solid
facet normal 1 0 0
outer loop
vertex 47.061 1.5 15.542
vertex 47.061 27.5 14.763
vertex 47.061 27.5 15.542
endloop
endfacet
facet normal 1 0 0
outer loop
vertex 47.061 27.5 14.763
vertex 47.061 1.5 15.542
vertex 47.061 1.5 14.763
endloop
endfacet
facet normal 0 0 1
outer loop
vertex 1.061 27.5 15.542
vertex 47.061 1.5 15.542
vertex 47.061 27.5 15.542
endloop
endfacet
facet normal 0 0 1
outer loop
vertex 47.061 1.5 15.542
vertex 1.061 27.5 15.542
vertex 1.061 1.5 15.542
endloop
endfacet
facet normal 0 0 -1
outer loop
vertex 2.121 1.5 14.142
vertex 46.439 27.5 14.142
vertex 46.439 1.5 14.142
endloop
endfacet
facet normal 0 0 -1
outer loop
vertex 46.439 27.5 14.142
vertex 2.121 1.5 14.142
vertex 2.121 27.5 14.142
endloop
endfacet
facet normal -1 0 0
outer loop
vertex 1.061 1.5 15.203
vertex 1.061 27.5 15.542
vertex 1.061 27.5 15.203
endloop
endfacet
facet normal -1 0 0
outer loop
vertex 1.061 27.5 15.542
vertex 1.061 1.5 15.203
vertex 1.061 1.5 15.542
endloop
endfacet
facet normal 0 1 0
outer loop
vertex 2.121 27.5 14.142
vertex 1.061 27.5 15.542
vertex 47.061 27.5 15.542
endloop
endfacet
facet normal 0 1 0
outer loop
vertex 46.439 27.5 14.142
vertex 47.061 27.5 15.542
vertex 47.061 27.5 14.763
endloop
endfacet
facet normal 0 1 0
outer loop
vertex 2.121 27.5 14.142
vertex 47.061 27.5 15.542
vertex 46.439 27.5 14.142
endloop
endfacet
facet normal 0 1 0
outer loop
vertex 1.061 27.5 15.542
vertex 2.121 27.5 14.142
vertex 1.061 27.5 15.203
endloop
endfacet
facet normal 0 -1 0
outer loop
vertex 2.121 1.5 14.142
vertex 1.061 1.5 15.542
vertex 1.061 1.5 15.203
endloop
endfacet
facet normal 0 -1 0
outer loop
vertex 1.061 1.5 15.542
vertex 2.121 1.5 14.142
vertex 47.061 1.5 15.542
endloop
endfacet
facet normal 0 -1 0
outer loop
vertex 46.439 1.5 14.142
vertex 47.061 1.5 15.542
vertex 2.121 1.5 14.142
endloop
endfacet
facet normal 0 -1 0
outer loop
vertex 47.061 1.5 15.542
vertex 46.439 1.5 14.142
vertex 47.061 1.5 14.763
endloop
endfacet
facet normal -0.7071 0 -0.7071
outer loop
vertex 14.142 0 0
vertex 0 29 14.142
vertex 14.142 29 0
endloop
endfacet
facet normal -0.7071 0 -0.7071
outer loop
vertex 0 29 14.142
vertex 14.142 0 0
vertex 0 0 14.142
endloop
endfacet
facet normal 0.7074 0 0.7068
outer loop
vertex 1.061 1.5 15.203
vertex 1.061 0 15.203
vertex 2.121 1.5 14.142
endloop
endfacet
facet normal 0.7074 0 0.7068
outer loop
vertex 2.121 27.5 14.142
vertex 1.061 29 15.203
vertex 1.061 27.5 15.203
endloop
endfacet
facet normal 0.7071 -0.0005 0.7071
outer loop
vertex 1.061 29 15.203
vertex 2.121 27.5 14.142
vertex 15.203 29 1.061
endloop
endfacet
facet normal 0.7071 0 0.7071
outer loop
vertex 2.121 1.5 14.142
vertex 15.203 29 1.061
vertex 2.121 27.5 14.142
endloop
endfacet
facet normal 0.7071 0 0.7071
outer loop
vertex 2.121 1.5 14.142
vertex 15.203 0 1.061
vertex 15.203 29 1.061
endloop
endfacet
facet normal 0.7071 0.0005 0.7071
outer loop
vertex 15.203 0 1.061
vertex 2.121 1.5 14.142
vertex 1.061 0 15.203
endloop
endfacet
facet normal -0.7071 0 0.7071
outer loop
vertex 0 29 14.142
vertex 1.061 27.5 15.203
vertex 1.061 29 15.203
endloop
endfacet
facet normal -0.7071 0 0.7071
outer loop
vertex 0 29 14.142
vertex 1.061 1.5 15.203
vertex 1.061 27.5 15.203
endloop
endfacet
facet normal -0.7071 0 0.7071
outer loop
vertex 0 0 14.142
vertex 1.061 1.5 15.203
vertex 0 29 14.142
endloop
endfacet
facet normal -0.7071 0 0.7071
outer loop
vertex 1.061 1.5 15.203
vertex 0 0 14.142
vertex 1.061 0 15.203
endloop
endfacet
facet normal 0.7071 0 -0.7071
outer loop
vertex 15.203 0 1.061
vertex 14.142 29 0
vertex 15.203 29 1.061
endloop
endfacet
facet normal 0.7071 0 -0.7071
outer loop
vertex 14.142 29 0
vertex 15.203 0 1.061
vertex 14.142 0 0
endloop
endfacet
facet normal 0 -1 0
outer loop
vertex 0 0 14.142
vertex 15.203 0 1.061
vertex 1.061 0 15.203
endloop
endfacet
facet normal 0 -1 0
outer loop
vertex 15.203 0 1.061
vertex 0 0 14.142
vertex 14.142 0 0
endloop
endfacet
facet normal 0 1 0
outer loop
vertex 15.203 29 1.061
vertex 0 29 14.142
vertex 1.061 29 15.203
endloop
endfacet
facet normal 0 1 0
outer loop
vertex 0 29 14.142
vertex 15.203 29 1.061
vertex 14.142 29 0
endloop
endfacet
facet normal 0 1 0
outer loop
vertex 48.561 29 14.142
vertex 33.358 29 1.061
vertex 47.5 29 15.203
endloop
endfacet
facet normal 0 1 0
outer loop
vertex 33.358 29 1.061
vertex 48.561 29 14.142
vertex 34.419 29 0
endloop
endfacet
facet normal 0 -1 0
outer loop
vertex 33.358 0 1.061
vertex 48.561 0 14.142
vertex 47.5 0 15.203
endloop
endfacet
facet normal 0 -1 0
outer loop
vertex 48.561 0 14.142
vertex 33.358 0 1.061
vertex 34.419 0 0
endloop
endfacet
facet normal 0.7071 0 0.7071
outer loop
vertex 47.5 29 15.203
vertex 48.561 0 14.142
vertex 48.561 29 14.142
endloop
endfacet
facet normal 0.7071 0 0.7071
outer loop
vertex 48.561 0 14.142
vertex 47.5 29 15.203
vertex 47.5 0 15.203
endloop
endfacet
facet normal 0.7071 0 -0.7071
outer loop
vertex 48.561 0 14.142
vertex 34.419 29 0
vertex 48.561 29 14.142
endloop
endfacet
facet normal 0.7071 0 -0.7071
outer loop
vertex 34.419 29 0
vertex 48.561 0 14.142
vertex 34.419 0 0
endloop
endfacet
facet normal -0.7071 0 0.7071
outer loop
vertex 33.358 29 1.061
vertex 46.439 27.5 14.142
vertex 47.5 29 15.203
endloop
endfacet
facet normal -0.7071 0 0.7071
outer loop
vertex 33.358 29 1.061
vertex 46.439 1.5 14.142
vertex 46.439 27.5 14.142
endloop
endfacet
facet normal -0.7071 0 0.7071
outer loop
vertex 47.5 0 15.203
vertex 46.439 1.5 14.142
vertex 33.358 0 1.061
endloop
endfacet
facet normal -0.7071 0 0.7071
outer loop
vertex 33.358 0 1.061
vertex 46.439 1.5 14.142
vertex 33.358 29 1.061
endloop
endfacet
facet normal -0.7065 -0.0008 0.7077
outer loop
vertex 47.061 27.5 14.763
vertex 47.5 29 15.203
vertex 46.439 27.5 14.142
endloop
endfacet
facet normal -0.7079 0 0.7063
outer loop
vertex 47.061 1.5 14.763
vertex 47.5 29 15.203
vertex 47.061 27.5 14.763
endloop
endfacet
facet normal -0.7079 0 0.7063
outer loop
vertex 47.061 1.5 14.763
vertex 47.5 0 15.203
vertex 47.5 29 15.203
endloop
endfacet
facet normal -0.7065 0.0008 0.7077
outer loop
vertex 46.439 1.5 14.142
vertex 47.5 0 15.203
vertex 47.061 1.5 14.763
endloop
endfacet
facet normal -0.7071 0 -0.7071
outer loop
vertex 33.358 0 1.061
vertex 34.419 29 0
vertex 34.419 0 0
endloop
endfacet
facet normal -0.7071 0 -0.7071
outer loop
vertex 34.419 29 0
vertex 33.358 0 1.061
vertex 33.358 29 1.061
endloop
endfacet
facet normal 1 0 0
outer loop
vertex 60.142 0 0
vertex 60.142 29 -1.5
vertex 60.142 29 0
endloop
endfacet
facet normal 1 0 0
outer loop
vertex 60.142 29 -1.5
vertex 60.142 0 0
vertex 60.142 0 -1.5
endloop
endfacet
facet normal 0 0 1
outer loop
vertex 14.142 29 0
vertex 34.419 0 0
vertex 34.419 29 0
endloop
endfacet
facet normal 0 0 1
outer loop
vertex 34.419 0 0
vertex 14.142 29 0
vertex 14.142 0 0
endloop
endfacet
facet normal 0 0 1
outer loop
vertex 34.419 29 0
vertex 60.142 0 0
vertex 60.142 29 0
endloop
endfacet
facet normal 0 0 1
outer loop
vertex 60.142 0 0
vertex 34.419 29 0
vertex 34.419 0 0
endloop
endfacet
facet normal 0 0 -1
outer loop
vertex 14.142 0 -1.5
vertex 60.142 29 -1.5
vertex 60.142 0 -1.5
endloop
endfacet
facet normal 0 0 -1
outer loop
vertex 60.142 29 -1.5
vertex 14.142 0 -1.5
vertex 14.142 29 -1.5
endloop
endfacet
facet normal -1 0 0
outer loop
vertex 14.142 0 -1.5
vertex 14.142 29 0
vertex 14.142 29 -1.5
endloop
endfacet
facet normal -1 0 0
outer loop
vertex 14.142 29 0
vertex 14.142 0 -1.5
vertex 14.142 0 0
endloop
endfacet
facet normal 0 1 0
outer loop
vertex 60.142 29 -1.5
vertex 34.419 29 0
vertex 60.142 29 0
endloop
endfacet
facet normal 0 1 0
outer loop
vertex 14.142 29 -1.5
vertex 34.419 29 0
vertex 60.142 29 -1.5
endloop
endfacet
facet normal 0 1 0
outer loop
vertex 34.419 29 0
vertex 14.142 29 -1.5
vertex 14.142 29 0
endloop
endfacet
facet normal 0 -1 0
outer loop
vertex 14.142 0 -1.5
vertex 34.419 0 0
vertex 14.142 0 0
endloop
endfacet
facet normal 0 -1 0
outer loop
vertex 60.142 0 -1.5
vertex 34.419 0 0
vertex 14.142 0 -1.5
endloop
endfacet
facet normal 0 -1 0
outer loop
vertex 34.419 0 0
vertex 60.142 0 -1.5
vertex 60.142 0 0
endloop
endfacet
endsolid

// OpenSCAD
// file: snzb-03.scad
$fn = 100;

module snzb03() {
  $WIDTH = 40;
  $HEIGHT = 35;
  $DEPTH = 16;
  $DIAMETER_DOME = 22;
  $DIAMETER_HOLE = 1;
  $DEPTH_RECESS = 0.5;

  // dome
  translate([$WIDTH / 2, $HEIGHT / 2, $DEPTH]) rotate([0, 90, 0]) sphere(d = $DIAMETER_DOME, $fn = 32);
  difference() {
    // main body
    cube([$WIDTH, $HEIGHT, $DEPTH]);

    // hole
    translate([$WIDTH / 2, 5, 9]) rotate([90, 0, 0]) cylinder(h = 10, d = $DIAMETER_HOLE);

    // cut corners
    translate([-2.75, -2.75, $DEPTH]) rotate([0, 0, 45]) cube([10, 10, $DEPTH * 2], center = true);
    translate([$WIDTH, $HEIGHT, 0]) translate([2.75, 2.75, $DEPTH]) rotate([0, 0, 45]) cube([10, 10, $DEPTH * 2], center = true);

    // recesses
    translate([2.5, -1, 1.5]) cube([$WIDTH, $DEPTH_RECESS + 1, 13.5]);
    translate([$WIDTH - $DEPTH_RECESS, $HEIGHT - 2.5, 1.5]) rotate([0, 0, -90]) cube([$WIDTH, $DEPTH_RECESS + 1, 13.5]);
    translate([-2.5, $HEIGHT - 1, 1.5]) cube([$WIDTH, $DEPTH_RECESS + 1, 13.5]);
    translate([$DEPTH_RECESS, 2.5, 1.5]) rotate([0, 0, 90]) cube([$WIDTH, $DEPTH_RECESS + 1, 13.5]);
  }
}
// main file
include <snzb-03.scad>;

$WALLS = 1.5;
$DELTA = 0.1;
$2DELTA = 2 * $DELTA;

  $WIDTH = 40;
  $WIDTH_ADAPTER = $WIDTH + 2 * $WALLS;
  $HEIGHT = 35;
  $HEIGHT_ADAPTER = $HEIGHT + 2 * $WALLS;
  $DEPTH = 16;
  $DEPTH_ADAPTER = $WALLS * 3;

module plate() {

  difference() {
    // base cube
    cube([$WIDTH_ADAPTER, $HEIGHT_ADAPTER, $DEPTH_ADAPTER]);
    // cutouts
    // big hole
    translate([$WALLS + 0.5 - $DELTA, $WALLS + 0.5 - $DELTA, $WALLS]) cube([$WIDTH - 2 * 0.5 + $2DELTA, 1.5 * $HEIGHT, $DEPTH]);
    // slot
    translate([$WALLS - $DELTA, $WALLS, $WALLS]) cube([$WIDTH + $2DELTA, 1.5 * $HEIGHT, $WALLS + $2DELTA]);
    // cut corner
    translate([$WALLS + 3, $WALLS + 3, 0]) translate([-20, -20, $WALLS]) cube([20, 20, $DEPTH * 2]);
    translate([$WIDTH - $WALLS, $HEIGHT - $WALLS, 0]) translate([0, 0, $WALLS]) cube([20, 20, $DEPTH * 2]);
    // cut corner
    translate([-2, -2, $DEPTH * 0.5]) rotate([0, 0, 45]) cube([10, 10, $DEPTH * 2], center = true);
    translate([$WIDTH + 2 * $WALLS, $HEIGHT + 2 * $WALLS, 0])
      translate([2, 2, $DEPTH * 0.5]) rotate([0, 0, 45]) cube([10, 10, $DEPTH * 2], center = true);
  }
// stopper
  translate([$WIDTH_ADAPTER / 4, $HEIGHT_ADAPTER - $WALLS / 2, $WALLS]) rotate([0, 90, 0]) cylinder(h = $HEIGHT_ADAPTER / 2, d = 1);
// catch plate
translate([-$WALLS, $WALLS * 4, 0]) cube([$WIDTH_ADAPTER + $WALLS * 2, $HEIGHT_ADAPTER - $WALLS * 8, $WALLS - $DELTA]);
}

//plate();
//color("red") translate([$WALLS, $WALLS, $WALLS]) snzb03();


$flange_length = $HEIGHT_ADAPTER - $WALLS * 8;
module holder() {
  $angle_x = 45;
  $holder_depth = 20;
  $holder_height = $flange_length + $WALLS * 2;
  $holder_width = $WIDTH_ADAPTER + $WALLS * 2;
  $offset_x = sin($angle_x) * $holder_depth;
  $offset_z = sin($angle_x) * $WALLS;
  $flange_offset_x = cos($angle_x) * $WALLS;
  $flange_offset_z = sin($angle_x) * $holder_depth;
  //flange dummy
  color("red") translate([$flange_offset_x, $WALLS, $flange_offset_z]) cube([$WIDTH_ADAPTER + $WALLS * 2, $flange_length, $WALLS - $DELTA]);
  //left
  translate([$offset_x, 0, 0]) rotate(-$angle_x, [0, 1, 0]) cube([$WALLS, $holder_height, $holder_depth]);
  //right
  translate([$holder_width + $WALLS - $offset_x, 0, $offset_z]) rotate($angle_x, [0, 1, 0]) cube([$WALLS, $holder_height, $holder_depth]);
  //bottom
  translate([$offset_x, 0, -$WALLS]) cube([$holder_width, $holder_height, $WALLS]);
}
holder();
